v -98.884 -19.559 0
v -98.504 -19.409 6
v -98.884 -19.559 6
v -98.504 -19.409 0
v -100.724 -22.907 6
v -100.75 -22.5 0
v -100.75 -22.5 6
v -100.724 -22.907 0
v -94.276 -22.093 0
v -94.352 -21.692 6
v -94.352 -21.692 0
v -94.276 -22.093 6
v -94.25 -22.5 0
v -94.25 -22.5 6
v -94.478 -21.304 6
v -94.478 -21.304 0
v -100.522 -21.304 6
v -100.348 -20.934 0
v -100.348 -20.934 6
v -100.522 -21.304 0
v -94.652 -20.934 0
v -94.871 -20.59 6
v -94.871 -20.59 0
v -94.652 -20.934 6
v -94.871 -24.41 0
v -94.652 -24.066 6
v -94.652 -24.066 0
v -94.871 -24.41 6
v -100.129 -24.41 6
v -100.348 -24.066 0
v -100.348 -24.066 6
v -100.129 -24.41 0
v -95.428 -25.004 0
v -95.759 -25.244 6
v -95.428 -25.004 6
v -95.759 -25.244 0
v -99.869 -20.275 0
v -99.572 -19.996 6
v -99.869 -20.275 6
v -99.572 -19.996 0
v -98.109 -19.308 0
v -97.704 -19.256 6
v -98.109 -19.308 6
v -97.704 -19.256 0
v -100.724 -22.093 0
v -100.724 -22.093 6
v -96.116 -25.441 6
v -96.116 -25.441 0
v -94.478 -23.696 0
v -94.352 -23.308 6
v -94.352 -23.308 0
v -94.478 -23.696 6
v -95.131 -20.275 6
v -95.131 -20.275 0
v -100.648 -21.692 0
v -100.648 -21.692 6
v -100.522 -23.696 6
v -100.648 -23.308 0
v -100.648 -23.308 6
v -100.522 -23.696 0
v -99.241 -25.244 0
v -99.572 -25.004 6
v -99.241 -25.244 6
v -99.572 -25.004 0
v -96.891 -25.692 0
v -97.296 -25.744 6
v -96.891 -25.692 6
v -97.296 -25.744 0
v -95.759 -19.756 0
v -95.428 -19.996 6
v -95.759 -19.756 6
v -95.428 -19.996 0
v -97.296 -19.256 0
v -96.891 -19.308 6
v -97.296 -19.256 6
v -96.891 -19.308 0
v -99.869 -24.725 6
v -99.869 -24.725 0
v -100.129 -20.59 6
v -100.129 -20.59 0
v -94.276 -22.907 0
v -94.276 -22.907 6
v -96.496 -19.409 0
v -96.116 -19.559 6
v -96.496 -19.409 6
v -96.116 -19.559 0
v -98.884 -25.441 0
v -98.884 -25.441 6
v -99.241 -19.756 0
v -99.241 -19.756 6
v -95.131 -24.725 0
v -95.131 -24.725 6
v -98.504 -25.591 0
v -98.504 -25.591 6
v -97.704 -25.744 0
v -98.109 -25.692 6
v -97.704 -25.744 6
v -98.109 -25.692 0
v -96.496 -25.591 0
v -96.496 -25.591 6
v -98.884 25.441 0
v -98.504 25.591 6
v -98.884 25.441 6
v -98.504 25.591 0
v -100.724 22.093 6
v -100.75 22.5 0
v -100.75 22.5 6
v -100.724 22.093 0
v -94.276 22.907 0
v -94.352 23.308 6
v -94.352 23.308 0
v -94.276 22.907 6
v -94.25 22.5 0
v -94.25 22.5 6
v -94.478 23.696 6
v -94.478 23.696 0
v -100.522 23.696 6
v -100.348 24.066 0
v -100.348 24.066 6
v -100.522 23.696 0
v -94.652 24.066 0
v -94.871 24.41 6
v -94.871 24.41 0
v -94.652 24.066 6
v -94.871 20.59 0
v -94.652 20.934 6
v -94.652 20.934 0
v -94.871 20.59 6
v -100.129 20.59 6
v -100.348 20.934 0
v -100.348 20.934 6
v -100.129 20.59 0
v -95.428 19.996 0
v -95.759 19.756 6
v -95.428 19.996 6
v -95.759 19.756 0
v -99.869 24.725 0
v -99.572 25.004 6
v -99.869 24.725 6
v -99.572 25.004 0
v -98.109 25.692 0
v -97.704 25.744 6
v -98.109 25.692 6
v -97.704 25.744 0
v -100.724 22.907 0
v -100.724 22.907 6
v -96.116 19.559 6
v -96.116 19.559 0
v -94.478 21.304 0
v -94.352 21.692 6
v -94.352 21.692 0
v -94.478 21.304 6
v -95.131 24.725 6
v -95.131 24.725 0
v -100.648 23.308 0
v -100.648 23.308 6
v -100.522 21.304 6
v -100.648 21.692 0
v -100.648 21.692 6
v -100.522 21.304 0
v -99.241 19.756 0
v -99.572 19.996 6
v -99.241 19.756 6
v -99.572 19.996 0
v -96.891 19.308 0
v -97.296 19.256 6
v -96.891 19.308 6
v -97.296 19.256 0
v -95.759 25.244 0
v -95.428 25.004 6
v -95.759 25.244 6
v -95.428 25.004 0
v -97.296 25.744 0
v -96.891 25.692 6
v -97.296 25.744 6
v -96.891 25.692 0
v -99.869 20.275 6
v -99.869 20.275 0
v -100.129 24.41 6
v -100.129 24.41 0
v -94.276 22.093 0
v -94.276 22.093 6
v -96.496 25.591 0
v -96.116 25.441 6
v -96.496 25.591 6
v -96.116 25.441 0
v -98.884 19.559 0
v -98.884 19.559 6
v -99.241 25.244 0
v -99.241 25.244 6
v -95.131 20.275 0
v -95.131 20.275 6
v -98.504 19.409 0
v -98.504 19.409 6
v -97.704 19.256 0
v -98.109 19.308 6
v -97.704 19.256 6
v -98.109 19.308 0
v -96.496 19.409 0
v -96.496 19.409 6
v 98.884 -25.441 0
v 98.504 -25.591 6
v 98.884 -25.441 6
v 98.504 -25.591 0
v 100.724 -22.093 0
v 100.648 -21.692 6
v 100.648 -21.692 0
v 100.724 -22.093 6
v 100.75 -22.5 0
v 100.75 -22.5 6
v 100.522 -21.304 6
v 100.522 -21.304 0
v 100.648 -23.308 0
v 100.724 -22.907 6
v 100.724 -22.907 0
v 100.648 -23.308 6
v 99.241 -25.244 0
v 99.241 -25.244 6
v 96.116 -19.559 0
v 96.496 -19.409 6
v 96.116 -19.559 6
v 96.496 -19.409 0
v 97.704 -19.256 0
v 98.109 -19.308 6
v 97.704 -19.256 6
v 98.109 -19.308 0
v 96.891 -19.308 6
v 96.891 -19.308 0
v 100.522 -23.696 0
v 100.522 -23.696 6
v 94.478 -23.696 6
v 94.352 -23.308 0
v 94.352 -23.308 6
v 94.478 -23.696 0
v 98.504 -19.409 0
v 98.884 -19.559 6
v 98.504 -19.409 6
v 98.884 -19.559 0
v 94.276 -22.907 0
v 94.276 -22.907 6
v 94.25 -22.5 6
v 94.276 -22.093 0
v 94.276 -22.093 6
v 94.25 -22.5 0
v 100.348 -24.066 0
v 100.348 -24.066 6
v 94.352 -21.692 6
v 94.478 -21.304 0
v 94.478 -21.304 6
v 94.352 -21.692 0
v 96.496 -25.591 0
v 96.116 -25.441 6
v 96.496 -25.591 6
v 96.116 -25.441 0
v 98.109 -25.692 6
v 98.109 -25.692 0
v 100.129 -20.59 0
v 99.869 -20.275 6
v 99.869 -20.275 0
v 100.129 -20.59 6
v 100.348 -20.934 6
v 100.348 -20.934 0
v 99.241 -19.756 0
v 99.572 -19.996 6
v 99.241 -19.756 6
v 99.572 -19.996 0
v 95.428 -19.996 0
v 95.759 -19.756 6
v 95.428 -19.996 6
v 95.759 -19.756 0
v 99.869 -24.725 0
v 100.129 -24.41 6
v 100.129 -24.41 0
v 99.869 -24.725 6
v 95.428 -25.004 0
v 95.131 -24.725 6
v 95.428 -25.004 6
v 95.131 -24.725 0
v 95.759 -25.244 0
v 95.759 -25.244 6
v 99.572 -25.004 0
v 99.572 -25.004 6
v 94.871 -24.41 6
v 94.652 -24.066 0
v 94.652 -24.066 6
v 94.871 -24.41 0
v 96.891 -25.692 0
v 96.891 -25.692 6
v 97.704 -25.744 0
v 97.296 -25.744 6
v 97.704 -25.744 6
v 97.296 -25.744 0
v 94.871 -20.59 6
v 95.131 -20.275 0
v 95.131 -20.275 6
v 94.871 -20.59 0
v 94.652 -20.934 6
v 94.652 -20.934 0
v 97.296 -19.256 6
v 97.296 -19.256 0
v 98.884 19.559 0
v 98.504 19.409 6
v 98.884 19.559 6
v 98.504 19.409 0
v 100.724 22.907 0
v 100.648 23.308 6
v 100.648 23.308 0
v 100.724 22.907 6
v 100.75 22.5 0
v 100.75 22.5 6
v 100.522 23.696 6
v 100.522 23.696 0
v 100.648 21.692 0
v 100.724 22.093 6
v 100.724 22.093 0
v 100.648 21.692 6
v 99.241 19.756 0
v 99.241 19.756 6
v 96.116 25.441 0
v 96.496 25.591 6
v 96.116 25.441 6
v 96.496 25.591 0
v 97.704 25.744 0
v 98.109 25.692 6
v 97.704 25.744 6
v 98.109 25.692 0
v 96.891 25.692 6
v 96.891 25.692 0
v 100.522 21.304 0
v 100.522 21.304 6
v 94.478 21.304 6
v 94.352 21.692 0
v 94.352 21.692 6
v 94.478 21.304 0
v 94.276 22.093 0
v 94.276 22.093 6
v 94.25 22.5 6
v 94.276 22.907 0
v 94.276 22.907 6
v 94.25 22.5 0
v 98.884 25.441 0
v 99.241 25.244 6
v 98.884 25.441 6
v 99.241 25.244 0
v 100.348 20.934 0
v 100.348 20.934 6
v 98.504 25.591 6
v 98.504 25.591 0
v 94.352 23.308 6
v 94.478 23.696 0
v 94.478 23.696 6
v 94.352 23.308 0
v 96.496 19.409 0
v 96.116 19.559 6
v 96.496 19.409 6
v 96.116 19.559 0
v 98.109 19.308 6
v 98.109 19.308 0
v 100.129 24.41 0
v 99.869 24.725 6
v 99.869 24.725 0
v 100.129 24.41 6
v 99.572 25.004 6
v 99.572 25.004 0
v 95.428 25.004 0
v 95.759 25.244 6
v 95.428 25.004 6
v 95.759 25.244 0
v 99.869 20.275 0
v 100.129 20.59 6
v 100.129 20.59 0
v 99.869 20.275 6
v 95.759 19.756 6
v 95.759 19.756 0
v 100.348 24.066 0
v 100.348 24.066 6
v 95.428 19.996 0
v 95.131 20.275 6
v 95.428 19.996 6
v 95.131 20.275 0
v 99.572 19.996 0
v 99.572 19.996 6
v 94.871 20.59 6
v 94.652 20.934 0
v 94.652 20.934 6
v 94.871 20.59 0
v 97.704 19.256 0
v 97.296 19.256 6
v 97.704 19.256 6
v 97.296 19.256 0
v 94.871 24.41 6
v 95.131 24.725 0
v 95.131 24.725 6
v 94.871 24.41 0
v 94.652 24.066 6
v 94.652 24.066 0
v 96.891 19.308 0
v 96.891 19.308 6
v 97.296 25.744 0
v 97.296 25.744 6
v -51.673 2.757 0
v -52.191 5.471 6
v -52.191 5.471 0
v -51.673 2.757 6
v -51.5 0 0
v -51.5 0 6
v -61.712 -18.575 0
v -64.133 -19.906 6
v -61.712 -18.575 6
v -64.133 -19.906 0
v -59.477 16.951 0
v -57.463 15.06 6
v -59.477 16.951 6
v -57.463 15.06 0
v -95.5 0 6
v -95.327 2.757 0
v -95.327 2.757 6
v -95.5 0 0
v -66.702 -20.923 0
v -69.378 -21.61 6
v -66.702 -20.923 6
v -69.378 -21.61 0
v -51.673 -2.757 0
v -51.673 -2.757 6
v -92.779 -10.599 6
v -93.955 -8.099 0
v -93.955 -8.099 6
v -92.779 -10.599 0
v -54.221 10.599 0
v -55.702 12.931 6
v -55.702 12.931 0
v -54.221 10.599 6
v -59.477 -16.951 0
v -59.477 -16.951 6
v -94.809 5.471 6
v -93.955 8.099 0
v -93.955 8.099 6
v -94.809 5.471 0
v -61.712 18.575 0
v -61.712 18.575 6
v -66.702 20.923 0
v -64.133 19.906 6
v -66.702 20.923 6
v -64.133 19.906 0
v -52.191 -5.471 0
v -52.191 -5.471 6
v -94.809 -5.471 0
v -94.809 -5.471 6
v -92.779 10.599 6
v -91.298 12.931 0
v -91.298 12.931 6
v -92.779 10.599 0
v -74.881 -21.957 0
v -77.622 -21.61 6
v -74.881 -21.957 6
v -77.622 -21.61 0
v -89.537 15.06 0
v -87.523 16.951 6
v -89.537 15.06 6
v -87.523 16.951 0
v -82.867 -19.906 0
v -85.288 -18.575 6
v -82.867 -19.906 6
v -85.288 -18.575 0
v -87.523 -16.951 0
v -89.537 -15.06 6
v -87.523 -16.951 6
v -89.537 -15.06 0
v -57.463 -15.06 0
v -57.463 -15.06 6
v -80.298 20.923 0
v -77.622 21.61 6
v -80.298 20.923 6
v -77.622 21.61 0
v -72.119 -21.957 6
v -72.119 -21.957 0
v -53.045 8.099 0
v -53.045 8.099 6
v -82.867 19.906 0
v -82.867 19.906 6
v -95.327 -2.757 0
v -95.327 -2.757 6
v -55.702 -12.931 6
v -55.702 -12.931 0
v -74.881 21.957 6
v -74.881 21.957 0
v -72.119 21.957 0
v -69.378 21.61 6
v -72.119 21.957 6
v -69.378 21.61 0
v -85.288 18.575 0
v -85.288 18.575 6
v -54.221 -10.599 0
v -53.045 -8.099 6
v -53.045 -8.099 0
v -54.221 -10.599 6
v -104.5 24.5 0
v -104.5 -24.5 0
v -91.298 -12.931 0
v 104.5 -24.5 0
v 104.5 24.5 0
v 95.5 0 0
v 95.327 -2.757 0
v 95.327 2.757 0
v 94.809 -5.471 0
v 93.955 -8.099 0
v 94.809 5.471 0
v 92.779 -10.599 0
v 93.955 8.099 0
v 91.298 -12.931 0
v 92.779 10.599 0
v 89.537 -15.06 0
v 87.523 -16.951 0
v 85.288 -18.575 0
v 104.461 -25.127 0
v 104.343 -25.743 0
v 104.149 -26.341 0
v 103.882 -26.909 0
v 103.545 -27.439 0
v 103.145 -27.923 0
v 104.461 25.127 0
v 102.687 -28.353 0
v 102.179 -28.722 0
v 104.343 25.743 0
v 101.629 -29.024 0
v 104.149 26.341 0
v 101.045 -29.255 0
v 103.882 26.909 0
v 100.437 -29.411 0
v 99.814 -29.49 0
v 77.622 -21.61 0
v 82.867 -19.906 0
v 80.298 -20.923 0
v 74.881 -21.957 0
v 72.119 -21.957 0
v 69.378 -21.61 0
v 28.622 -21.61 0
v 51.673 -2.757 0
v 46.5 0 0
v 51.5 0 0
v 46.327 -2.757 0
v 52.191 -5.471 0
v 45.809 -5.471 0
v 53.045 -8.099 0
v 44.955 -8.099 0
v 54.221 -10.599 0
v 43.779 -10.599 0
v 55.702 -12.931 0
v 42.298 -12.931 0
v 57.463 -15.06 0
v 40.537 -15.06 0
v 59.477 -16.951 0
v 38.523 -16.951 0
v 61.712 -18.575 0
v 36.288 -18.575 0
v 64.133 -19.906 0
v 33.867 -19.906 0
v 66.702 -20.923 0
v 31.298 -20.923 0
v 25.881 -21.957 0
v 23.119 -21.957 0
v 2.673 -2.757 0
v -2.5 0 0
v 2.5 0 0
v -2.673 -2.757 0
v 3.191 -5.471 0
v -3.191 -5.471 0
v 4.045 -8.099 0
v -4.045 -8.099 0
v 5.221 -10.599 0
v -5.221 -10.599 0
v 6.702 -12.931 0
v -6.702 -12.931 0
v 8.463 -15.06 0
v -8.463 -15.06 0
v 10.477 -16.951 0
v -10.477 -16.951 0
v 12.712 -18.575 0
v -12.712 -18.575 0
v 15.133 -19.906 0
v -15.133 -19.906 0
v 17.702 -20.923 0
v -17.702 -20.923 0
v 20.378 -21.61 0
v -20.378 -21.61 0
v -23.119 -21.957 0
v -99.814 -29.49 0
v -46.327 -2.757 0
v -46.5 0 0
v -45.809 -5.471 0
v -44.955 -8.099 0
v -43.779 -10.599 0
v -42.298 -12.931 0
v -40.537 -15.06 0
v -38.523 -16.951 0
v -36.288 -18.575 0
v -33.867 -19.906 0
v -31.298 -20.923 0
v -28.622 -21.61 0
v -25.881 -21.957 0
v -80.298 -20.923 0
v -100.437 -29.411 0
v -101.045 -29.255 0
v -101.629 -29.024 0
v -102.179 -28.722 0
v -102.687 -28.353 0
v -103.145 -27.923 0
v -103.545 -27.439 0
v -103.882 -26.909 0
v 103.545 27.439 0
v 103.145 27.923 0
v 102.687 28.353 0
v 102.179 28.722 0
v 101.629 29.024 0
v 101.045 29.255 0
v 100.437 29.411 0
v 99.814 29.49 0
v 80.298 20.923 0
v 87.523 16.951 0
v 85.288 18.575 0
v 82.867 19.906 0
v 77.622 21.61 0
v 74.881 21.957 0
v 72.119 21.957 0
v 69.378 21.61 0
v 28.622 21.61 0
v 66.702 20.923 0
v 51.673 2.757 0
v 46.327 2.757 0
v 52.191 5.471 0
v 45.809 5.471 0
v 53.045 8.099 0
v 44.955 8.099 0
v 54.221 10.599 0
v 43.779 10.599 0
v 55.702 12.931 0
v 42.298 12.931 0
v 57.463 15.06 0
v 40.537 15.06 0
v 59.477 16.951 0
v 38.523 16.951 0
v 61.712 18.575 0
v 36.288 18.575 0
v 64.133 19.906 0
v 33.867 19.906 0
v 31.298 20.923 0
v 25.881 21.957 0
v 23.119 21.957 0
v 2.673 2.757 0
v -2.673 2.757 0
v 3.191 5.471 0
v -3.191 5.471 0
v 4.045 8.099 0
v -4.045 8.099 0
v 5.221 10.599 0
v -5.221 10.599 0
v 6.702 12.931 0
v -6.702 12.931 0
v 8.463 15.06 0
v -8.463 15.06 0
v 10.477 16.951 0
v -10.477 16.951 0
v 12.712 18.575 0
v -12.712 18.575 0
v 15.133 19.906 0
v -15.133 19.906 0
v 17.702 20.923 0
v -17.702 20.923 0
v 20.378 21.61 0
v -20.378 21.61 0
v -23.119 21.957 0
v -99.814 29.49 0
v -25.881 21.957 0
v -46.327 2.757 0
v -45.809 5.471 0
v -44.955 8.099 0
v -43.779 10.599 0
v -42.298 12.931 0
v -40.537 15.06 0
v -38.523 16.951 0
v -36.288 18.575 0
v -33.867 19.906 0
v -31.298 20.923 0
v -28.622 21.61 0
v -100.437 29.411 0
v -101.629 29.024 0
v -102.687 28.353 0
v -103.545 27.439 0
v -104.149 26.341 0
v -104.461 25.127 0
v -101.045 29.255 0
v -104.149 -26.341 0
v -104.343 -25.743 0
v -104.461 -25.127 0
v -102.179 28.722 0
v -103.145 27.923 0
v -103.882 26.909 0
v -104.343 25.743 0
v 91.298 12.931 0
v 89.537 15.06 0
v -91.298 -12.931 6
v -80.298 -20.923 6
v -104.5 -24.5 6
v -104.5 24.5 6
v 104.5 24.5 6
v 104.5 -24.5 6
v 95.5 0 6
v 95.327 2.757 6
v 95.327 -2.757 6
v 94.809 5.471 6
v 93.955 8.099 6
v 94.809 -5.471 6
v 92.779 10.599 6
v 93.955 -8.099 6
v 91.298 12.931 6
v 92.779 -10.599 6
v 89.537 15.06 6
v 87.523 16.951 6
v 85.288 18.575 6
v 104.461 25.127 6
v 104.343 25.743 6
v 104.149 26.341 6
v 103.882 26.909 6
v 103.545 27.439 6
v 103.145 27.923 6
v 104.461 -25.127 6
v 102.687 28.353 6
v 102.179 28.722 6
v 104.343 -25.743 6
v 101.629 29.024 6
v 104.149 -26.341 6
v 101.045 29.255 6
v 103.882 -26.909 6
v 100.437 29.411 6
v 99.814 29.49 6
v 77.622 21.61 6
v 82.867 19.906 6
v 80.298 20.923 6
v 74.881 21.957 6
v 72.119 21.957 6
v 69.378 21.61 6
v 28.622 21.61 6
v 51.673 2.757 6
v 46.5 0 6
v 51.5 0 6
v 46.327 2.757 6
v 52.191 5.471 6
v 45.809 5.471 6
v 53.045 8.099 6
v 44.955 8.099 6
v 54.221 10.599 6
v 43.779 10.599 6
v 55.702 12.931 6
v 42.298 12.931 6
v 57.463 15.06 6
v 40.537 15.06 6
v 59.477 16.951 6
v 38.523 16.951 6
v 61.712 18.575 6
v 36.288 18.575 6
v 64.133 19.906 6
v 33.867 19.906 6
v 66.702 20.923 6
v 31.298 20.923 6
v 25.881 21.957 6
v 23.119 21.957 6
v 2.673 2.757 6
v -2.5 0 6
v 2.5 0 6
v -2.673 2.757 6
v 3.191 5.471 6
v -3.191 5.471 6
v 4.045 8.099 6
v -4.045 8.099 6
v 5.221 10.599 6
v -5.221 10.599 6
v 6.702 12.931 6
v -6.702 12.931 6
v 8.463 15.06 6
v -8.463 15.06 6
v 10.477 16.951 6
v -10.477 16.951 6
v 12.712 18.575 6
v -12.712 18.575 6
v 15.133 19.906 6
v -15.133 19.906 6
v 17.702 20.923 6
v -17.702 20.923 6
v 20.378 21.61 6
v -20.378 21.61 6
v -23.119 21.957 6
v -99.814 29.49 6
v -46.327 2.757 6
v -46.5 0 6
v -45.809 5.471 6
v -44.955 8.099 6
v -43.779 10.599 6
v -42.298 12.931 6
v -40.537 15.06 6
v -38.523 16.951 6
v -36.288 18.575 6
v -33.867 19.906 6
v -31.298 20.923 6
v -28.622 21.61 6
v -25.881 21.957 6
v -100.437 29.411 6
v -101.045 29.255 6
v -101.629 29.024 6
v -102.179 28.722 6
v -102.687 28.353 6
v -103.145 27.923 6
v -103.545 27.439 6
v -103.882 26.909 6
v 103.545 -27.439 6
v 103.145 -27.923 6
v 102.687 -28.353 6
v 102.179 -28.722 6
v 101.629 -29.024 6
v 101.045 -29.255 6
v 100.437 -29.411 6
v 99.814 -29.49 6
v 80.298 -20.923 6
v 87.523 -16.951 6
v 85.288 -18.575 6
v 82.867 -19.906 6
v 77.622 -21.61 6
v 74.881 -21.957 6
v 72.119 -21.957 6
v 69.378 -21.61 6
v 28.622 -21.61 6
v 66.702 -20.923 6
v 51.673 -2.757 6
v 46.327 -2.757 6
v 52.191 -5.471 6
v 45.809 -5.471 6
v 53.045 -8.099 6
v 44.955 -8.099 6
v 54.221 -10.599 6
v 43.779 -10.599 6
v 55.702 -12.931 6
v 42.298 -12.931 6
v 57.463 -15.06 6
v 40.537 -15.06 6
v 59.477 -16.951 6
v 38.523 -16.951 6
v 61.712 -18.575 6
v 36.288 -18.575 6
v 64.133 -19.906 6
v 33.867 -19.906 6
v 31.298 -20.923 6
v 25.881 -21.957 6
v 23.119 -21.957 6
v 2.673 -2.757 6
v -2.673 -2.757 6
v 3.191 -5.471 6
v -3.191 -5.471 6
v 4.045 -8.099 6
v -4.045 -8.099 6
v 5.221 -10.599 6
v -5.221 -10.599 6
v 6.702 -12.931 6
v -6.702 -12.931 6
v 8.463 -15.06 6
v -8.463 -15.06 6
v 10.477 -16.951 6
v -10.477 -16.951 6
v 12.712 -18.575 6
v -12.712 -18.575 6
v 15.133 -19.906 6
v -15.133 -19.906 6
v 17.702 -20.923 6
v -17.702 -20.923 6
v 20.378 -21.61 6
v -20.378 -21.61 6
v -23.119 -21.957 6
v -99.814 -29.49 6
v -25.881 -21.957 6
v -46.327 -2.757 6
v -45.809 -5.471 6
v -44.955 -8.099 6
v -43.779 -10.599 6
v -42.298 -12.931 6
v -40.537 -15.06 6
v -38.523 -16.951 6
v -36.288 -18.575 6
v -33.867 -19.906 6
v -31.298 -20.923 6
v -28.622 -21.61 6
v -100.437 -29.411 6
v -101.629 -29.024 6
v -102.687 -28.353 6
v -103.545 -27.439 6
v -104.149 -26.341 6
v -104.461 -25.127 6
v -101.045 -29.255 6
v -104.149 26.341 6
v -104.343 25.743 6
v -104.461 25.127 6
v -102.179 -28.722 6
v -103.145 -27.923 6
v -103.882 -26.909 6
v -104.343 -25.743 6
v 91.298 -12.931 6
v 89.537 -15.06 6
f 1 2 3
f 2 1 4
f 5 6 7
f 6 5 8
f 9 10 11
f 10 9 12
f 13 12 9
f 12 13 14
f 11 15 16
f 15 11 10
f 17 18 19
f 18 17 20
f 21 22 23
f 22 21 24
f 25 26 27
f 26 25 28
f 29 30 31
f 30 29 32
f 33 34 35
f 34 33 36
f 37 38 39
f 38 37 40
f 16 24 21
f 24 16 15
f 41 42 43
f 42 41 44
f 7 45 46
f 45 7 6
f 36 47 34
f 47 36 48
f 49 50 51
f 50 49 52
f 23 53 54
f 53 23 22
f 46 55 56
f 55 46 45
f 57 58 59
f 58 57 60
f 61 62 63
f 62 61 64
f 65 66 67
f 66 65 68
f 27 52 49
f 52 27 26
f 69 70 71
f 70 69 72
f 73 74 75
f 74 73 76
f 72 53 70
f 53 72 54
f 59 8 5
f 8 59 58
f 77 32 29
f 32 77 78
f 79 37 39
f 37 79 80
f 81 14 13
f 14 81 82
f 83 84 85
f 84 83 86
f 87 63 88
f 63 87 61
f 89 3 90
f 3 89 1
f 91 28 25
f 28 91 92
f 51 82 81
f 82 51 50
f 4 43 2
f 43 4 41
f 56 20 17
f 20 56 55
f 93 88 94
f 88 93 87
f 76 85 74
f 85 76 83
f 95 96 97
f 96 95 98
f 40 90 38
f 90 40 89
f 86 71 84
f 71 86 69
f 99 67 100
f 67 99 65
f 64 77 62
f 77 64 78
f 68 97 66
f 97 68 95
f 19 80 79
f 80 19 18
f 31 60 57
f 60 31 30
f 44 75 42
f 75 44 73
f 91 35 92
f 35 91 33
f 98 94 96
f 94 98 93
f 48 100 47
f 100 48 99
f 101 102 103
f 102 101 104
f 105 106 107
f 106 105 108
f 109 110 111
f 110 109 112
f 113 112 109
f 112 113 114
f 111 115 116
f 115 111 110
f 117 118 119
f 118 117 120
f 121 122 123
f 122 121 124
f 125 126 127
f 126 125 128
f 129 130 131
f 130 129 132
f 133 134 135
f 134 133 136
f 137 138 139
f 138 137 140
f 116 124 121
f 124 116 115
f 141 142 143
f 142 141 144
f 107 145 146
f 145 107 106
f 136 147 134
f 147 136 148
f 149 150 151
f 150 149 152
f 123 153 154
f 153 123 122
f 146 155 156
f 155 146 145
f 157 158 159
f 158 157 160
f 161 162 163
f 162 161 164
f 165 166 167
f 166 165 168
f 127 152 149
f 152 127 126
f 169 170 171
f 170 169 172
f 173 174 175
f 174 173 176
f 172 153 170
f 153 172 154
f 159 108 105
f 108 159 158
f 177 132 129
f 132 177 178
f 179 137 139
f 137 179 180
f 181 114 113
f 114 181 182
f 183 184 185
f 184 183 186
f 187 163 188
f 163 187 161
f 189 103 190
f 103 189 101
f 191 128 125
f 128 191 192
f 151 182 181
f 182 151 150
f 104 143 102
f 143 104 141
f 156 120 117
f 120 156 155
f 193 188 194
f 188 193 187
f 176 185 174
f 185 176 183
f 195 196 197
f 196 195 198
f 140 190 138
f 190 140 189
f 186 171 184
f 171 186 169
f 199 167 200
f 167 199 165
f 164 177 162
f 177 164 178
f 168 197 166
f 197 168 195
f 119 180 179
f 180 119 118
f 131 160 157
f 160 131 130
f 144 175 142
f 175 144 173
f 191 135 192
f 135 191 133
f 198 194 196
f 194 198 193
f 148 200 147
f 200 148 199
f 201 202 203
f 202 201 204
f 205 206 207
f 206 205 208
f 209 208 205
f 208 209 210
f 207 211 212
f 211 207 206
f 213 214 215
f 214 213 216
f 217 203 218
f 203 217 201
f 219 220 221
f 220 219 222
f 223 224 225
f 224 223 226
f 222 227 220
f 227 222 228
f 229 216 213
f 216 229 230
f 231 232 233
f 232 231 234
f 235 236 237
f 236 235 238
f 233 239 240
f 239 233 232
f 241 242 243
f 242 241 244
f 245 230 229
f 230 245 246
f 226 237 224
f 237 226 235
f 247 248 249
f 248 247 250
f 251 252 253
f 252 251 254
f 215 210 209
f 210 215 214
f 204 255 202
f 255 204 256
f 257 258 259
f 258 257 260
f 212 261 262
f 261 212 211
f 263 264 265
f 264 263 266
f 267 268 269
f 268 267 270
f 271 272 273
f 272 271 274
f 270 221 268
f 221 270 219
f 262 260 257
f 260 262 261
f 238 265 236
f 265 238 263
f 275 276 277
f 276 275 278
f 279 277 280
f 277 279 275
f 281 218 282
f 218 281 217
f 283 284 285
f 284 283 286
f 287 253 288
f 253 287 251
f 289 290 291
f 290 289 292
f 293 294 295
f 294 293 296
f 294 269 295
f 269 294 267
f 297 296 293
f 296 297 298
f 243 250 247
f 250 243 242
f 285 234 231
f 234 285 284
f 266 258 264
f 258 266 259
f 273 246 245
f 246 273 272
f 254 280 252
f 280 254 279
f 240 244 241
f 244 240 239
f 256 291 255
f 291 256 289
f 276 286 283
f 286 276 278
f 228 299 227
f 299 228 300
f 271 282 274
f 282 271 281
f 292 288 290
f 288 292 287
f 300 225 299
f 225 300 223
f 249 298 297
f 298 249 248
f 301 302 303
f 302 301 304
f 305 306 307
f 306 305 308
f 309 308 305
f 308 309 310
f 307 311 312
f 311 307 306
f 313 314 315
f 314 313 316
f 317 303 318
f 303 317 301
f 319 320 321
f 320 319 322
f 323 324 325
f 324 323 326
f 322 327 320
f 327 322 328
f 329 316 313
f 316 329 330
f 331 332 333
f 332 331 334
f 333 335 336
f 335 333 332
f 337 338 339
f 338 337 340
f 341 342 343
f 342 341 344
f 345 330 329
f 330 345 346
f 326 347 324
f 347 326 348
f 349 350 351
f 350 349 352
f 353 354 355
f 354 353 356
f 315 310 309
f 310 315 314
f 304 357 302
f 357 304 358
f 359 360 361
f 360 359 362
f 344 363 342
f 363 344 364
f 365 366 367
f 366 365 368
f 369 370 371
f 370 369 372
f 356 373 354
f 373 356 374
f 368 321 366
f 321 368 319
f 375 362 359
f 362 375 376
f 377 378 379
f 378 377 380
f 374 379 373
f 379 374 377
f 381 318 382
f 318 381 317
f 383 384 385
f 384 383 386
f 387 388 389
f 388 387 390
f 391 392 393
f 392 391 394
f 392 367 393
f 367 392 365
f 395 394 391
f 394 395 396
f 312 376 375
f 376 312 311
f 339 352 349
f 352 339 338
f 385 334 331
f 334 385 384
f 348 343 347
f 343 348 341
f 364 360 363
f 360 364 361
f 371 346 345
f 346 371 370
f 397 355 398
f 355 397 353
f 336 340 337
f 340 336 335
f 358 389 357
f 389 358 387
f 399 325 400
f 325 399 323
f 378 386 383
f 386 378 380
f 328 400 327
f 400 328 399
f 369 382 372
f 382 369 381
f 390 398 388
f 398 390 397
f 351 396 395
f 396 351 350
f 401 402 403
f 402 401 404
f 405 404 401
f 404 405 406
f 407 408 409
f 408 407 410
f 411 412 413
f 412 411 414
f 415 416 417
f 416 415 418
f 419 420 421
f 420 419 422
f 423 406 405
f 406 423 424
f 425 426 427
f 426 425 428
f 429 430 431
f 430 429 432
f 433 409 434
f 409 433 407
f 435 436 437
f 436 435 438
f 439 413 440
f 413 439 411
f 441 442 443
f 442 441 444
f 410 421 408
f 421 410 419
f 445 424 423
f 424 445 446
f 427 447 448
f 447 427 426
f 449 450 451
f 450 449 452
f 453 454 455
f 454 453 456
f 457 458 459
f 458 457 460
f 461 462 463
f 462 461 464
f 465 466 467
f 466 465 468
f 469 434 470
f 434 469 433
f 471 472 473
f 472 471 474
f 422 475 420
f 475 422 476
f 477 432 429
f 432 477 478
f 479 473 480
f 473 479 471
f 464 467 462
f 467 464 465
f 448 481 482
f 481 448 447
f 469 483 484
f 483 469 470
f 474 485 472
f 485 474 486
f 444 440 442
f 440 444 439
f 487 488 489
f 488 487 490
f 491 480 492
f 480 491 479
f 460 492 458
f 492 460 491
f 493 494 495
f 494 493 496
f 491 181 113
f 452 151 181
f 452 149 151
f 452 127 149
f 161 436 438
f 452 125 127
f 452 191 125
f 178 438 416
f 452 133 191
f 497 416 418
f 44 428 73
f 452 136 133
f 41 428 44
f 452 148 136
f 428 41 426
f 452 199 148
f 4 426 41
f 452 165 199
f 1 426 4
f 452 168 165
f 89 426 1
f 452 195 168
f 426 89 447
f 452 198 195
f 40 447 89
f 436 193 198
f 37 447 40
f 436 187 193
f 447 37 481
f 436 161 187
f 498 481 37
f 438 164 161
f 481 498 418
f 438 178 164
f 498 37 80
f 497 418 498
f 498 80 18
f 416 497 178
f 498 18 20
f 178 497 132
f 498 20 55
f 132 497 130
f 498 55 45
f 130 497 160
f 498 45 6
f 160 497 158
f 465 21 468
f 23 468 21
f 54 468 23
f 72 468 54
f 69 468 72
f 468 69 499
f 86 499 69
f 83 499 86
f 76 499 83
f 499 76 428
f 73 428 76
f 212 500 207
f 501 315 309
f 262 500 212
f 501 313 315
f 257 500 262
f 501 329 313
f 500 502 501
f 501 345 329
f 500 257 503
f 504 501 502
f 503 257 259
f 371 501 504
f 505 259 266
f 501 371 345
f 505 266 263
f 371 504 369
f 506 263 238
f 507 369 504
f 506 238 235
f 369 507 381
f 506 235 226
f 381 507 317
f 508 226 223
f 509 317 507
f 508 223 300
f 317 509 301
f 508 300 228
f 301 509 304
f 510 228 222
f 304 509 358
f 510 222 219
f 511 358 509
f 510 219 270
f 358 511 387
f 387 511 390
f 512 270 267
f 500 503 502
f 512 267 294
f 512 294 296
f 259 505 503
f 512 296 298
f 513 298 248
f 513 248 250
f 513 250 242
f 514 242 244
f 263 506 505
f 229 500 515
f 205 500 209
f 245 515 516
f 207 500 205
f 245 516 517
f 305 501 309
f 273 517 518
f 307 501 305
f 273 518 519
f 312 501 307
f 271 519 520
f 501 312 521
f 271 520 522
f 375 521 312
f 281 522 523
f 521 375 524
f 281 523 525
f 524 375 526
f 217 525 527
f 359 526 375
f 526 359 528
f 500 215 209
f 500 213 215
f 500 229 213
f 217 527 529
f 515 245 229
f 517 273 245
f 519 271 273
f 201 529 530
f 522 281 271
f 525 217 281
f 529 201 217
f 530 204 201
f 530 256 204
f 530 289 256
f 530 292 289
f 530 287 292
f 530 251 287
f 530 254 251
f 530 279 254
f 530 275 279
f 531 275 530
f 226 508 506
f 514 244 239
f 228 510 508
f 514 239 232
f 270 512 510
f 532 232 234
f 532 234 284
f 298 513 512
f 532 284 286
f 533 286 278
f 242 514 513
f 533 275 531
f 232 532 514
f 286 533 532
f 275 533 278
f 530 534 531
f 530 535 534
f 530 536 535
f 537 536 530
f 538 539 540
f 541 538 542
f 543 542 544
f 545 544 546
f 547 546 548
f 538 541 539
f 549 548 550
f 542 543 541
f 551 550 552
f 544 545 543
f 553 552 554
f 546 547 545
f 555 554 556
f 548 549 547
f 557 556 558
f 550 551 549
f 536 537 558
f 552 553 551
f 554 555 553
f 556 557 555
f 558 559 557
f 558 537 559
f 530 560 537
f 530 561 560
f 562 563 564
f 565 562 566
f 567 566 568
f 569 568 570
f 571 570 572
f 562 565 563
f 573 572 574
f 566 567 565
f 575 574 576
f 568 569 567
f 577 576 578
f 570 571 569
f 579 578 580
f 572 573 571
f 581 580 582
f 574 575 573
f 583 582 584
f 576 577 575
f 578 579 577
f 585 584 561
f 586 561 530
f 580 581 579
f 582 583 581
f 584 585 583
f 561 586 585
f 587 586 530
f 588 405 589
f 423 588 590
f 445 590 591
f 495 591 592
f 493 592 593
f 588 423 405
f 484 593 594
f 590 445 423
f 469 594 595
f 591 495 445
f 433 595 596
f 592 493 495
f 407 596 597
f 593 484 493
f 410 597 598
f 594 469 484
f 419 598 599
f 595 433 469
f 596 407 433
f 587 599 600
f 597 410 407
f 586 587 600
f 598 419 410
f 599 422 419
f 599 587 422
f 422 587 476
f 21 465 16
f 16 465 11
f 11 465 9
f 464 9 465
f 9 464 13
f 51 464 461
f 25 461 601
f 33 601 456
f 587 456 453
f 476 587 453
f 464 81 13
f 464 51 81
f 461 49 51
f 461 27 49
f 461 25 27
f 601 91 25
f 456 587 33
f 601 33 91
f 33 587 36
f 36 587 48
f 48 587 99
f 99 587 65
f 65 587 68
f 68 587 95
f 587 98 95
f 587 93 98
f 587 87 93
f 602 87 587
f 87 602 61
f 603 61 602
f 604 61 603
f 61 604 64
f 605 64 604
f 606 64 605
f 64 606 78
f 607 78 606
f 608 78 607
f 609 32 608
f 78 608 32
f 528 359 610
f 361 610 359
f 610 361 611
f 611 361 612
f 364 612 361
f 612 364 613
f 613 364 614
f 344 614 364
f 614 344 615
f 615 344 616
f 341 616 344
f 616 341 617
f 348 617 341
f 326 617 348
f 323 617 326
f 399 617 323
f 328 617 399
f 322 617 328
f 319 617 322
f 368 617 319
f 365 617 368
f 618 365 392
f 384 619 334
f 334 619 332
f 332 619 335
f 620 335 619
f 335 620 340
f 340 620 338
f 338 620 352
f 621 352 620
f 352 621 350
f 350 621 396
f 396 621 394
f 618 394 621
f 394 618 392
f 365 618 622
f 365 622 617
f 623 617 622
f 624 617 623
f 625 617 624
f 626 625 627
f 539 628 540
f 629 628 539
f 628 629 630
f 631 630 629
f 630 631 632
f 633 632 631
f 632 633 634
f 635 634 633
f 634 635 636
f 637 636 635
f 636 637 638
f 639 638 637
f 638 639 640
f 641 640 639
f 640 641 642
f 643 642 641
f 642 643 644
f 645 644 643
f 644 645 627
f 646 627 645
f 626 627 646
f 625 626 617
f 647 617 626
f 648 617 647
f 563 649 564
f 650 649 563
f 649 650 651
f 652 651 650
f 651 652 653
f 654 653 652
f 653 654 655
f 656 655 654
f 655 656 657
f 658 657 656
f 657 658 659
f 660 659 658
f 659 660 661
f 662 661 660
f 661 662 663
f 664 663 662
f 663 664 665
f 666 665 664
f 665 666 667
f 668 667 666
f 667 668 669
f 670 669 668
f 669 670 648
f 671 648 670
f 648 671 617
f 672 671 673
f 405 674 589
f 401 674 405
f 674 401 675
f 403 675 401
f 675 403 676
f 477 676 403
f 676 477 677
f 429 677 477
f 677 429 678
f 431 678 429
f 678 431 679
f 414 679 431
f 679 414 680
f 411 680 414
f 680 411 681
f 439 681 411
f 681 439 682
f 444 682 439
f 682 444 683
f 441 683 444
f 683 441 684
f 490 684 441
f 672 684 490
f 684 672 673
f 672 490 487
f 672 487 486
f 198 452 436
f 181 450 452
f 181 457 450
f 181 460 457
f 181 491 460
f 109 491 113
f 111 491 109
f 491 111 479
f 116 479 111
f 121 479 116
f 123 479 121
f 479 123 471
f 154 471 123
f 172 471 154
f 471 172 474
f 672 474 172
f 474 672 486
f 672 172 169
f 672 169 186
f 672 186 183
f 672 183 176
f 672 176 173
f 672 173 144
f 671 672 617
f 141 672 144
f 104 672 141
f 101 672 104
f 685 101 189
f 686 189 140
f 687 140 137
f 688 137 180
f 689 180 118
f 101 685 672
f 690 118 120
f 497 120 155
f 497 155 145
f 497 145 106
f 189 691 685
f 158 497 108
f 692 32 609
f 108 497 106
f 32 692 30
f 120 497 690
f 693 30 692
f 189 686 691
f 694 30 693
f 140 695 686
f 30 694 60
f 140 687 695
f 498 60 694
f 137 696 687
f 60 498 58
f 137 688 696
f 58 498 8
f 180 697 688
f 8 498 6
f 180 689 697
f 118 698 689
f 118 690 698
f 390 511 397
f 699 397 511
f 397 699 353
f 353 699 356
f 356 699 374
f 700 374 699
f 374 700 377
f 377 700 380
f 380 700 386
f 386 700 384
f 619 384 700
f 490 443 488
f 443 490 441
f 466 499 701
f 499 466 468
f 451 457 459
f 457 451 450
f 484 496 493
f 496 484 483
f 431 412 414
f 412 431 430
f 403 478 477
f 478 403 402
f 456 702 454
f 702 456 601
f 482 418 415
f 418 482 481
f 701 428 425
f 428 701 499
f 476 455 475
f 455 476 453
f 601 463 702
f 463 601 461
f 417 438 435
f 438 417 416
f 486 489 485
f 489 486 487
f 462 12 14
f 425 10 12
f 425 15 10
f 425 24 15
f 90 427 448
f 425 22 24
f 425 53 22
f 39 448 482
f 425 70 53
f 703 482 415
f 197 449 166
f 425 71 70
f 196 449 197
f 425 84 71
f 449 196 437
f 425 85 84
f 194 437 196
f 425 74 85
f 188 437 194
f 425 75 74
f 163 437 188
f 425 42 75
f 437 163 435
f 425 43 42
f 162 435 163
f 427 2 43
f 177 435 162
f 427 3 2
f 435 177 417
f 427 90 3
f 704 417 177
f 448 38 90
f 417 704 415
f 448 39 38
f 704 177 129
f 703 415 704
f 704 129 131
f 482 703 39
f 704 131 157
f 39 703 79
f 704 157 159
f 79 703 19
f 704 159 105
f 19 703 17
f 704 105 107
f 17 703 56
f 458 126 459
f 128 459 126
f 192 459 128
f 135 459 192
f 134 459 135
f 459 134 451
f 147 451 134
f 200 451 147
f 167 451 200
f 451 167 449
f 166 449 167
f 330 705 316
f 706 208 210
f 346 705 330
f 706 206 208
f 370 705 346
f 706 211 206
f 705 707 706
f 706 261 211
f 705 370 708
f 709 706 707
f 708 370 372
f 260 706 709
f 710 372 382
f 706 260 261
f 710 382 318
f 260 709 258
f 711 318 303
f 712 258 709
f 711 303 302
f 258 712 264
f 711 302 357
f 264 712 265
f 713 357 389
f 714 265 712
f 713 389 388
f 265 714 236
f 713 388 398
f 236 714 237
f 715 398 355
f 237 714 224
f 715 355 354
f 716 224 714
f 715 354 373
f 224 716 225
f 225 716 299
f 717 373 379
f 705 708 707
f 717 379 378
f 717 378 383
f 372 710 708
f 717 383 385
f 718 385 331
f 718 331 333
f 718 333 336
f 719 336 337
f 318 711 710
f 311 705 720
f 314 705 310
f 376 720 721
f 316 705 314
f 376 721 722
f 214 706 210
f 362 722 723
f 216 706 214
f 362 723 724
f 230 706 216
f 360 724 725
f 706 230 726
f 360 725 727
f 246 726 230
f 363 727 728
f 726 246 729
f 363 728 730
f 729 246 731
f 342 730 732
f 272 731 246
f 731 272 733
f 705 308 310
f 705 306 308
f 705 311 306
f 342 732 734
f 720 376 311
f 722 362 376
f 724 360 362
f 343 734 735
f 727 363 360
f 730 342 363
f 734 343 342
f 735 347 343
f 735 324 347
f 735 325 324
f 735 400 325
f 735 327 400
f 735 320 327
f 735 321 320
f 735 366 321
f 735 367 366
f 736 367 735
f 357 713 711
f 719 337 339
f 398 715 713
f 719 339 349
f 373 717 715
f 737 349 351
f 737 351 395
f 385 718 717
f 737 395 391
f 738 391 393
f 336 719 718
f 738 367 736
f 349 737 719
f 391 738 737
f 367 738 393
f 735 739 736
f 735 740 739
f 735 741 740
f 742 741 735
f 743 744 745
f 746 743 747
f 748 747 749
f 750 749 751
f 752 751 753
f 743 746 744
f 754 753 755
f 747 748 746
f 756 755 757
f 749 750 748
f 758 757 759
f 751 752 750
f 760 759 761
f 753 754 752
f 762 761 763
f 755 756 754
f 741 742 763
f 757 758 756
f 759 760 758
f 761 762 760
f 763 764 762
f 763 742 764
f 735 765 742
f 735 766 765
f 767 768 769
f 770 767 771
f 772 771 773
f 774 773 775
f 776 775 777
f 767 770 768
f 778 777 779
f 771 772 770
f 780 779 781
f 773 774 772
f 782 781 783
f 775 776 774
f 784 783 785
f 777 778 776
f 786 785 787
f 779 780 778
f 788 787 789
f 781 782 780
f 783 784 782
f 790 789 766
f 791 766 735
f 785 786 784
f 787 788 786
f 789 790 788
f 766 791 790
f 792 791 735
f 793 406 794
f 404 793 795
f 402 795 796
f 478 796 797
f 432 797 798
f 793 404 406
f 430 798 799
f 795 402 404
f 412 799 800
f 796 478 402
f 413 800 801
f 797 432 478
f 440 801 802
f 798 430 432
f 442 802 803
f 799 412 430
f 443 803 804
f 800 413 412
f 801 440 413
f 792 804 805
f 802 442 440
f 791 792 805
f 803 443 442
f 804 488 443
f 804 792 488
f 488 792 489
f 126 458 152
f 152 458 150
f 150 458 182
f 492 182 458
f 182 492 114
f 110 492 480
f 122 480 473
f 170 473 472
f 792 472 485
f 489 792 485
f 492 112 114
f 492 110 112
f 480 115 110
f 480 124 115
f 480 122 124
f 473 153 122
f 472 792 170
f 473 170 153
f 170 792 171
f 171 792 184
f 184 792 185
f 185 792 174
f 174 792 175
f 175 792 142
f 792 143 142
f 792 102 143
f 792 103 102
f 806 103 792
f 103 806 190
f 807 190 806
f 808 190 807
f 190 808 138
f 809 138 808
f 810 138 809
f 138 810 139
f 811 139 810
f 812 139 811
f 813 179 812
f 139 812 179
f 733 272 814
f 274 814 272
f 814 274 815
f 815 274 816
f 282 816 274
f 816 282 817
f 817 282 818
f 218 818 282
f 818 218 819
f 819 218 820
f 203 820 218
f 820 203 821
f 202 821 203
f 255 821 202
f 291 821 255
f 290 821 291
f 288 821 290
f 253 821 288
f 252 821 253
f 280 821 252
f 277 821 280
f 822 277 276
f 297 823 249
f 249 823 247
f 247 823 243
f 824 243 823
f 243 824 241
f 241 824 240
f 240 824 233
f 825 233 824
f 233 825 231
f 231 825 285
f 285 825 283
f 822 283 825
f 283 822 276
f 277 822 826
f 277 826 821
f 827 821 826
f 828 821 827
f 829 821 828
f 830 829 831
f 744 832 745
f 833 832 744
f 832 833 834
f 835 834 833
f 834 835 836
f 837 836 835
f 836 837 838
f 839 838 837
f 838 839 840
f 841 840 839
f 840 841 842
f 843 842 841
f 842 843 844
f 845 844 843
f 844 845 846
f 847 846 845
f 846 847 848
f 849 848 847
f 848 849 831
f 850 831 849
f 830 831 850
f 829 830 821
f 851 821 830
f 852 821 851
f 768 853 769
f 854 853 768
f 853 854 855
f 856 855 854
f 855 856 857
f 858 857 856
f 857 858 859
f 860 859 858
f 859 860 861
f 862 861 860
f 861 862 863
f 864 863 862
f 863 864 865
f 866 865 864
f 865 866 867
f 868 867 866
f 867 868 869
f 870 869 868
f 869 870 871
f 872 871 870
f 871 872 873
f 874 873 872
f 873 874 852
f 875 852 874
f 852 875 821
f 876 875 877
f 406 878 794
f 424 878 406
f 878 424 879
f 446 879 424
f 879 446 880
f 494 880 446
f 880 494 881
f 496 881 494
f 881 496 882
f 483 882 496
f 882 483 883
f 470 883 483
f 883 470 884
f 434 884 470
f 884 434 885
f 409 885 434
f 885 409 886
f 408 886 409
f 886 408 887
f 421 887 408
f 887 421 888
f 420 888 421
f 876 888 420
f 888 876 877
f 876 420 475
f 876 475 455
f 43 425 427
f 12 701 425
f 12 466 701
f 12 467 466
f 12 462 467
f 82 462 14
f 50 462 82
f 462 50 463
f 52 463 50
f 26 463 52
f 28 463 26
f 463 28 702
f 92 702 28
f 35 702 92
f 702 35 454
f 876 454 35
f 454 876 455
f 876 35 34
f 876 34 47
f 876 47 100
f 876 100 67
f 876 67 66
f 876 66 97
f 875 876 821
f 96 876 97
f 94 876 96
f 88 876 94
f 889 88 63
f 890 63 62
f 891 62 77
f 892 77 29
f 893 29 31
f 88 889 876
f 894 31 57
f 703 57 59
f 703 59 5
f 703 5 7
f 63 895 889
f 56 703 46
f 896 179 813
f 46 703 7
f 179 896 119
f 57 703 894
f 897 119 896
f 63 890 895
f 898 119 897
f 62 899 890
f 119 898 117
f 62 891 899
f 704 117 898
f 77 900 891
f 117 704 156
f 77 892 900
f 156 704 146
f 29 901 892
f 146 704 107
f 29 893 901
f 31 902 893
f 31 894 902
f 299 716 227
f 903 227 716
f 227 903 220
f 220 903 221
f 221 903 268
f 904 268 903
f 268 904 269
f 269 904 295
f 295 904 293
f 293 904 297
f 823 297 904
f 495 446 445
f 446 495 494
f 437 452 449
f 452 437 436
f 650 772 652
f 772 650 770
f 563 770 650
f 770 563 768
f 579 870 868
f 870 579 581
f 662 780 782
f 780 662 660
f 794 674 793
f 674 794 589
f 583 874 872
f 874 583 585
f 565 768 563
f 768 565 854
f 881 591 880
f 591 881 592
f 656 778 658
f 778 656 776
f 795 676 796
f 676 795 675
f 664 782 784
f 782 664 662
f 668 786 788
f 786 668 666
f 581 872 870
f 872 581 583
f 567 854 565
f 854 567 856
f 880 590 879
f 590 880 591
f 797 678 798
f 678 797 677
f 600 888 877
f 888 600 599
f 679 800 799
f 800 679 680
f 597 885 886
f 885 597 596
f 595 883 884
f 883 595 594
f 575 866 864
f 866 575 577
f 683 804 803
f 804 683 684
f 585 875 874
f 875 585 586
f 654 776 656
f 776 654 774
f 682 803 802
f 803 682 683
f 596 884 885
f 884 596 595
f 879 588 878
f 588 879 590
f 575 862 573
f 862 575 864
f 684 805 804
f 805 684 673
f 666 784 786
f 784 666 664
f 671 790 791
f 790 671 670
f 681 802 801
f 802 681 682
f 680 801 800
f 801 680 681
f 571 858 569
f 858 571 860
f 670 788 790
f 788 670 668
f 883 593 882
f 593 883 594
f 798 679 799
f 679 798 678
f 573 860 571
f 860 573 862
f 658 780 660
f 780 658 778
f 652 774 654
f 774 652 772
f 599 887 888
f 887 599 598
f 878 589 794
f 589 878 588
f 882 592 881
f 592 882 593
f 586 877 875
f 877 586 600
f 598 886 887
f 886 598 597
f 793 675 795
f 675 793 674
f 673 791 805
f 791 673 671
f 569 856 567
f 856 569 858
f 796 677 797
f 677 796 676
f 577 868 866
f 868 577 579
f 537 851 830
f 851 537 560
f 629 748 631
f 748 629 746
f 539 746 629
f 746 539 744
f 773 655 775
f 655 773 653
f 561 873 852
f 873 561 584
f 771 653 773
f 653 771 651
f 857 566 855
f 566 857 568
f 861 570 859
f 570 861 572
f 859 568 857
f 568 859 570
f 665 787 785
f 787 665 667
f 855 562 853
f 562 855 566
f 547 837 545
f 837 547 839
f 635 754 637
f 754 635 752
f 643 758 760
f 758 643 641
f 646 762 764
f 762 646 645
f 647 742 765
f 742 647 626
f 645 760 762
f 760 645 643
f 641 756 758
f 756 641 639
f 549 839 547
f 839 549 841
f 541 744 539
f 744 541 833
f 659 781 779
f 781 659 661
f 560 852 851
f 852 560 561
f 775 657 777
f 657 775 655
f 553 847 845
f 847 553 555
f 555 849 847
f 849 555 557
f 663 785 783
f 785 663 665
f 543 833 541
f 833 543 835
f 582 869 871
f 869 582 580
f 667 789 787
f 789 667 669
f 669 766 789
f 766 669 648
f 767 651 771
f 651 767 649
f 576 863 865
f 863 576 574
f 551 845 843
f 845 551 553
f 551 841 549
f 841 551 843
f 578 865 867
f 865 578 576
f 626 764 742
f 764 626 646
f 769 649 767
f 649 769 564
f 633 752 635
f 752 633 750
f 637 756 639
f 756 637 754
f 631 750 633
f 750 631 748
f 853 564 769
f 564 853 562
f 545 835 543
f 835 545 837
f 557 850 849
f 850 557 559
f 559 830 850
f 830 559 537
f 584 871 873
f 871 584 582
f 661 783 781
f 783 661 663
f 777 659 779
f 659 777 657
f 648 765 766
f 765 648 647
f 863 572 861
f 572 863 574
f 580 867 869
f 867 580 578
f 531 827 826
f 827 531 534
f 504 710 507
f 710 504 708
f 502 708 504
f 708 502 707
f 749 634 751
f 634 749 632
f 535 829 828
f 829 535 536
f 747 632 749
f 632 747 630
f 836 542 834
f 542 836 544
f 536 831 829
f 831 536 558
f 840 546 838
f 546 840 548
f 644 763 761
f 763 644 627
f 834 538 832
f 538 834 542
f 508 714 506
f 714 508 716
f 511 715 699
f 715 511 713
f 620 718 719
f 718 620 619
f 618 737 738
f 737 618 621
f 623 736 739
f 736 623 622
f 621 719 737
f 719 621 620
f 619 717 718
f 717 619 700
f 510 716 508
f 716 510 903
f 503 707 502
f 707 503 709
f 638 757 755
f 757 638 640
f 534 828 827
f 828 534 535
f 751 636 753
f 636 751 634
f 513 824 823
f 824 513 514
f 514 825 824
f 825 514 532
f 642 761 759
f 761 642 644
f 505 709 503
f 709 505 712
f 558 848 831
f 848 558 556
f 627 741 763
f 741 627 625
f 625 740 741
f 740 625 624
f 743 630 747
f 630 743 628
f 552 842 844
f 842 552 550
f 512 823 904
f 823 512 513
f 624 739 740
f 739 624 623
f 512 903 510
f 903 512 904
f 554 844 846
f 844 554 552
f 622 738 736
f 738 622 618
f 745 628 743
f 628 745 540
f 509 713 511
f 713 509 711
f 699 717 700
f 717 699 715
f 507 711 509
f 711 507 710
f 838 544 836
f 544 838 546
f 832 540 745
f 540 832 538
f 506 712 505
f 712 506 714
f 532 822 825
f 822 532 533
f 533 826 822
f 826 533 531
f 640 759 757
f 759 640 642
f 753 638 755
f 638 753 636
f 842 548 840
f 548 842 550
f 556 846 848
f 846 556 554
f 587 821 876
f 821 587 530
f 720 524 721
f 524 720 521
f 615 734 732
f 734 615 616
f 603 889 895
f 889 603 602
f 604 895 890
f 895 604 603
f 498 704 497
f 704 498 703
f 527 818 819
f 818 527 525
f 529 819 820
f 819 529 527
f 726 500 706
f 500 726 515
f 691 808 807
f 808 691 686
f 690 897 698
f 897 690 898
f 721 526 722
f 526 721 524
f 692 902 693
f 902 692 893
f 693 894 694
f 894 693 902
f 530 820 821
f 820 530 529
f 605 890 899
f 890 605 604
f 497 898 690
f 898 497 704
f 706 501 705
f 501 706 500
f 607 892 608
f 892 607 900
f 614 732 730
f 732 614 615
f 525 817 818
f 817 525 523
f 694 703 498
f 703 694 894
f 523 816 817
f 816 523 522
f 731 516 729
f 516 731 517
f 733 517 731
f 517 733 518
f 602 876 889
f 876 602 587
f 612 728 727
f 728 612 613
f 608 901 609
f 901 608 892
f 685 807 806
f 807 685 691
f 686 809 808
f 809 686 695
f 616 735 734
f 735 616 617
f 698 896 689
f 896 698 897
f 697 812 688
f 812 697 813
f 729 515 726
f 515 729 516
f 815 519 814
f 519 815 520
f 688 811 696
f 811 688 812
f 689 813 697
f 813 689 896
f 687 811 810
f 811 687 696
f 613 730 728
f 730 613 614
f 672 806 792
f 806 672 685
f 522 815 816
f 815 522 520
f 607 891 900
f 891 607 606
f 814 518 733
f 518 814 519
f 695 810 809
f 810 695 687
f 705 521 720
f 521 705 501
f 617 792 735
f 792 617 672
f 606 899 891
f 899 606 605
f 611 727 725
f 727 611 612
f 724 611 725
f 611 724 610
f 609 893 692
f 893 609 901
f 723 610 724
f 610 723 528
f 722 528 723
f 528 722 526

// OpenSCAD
$fn = 50;


difference() {
	union() {
		hull() {
			translate(v = [-99.5000000000, 24.5000000000, 0]) {
				cylinder(h = 6, r = 5);
			}
			translate(v = [99.5000000000, 24.5000000000, 0]) {
				cylinder(h = 6, r = 5);
			}
			translate(v = [-99.5000000000, -24.5000000000, 0]) {
				cylinder(h = 6, r = 5);
			}
			translate(v = [99.5000000000, -24.5000000000, 0]) {
				cylinder(h = 6, r = 5);
			}
		}
	}
	union() {
		#translate(v = [-97.5000000000, -22.5000000000, -100.0000000000]) {
			cylinder(h = 200, r = 3.2500000000);
		}
		#translate(v = [-97.5000000000, 22.5000000000, -100.0000000000]) {
			cylinder(h = 200, r = 3.2500000000);
		}
		#translate(v = [97.5000000000, -22.5000000000, -100.0000000000]) {
			cylinder(h = 200, r = 3.2500000000);
		}
		#translate(v = [97.5000000000, 22.5000000000, -100.0000000000]) {
			cylinder(h = 200, r = 3.2500000000);
		}
		#translate(v = [-73.5000000000, 0, 0]) {
			cylinder(h = 6, r = 22.0000000000);
		}
		#translate(v = [-24.5000000000, 0, 0]) {
			cylinder(h = 6, r = 22.0000000000);
		}
		#translate(v = [24.5000000000, 0, 0]) {
			cylinder(h = 6, r = 22.0000000000);
		}
		#translate(v = [73.5000000000, 0, 0]) {
			cylinder(h = 6, r = 22.0000000000);
		}
	}
}
